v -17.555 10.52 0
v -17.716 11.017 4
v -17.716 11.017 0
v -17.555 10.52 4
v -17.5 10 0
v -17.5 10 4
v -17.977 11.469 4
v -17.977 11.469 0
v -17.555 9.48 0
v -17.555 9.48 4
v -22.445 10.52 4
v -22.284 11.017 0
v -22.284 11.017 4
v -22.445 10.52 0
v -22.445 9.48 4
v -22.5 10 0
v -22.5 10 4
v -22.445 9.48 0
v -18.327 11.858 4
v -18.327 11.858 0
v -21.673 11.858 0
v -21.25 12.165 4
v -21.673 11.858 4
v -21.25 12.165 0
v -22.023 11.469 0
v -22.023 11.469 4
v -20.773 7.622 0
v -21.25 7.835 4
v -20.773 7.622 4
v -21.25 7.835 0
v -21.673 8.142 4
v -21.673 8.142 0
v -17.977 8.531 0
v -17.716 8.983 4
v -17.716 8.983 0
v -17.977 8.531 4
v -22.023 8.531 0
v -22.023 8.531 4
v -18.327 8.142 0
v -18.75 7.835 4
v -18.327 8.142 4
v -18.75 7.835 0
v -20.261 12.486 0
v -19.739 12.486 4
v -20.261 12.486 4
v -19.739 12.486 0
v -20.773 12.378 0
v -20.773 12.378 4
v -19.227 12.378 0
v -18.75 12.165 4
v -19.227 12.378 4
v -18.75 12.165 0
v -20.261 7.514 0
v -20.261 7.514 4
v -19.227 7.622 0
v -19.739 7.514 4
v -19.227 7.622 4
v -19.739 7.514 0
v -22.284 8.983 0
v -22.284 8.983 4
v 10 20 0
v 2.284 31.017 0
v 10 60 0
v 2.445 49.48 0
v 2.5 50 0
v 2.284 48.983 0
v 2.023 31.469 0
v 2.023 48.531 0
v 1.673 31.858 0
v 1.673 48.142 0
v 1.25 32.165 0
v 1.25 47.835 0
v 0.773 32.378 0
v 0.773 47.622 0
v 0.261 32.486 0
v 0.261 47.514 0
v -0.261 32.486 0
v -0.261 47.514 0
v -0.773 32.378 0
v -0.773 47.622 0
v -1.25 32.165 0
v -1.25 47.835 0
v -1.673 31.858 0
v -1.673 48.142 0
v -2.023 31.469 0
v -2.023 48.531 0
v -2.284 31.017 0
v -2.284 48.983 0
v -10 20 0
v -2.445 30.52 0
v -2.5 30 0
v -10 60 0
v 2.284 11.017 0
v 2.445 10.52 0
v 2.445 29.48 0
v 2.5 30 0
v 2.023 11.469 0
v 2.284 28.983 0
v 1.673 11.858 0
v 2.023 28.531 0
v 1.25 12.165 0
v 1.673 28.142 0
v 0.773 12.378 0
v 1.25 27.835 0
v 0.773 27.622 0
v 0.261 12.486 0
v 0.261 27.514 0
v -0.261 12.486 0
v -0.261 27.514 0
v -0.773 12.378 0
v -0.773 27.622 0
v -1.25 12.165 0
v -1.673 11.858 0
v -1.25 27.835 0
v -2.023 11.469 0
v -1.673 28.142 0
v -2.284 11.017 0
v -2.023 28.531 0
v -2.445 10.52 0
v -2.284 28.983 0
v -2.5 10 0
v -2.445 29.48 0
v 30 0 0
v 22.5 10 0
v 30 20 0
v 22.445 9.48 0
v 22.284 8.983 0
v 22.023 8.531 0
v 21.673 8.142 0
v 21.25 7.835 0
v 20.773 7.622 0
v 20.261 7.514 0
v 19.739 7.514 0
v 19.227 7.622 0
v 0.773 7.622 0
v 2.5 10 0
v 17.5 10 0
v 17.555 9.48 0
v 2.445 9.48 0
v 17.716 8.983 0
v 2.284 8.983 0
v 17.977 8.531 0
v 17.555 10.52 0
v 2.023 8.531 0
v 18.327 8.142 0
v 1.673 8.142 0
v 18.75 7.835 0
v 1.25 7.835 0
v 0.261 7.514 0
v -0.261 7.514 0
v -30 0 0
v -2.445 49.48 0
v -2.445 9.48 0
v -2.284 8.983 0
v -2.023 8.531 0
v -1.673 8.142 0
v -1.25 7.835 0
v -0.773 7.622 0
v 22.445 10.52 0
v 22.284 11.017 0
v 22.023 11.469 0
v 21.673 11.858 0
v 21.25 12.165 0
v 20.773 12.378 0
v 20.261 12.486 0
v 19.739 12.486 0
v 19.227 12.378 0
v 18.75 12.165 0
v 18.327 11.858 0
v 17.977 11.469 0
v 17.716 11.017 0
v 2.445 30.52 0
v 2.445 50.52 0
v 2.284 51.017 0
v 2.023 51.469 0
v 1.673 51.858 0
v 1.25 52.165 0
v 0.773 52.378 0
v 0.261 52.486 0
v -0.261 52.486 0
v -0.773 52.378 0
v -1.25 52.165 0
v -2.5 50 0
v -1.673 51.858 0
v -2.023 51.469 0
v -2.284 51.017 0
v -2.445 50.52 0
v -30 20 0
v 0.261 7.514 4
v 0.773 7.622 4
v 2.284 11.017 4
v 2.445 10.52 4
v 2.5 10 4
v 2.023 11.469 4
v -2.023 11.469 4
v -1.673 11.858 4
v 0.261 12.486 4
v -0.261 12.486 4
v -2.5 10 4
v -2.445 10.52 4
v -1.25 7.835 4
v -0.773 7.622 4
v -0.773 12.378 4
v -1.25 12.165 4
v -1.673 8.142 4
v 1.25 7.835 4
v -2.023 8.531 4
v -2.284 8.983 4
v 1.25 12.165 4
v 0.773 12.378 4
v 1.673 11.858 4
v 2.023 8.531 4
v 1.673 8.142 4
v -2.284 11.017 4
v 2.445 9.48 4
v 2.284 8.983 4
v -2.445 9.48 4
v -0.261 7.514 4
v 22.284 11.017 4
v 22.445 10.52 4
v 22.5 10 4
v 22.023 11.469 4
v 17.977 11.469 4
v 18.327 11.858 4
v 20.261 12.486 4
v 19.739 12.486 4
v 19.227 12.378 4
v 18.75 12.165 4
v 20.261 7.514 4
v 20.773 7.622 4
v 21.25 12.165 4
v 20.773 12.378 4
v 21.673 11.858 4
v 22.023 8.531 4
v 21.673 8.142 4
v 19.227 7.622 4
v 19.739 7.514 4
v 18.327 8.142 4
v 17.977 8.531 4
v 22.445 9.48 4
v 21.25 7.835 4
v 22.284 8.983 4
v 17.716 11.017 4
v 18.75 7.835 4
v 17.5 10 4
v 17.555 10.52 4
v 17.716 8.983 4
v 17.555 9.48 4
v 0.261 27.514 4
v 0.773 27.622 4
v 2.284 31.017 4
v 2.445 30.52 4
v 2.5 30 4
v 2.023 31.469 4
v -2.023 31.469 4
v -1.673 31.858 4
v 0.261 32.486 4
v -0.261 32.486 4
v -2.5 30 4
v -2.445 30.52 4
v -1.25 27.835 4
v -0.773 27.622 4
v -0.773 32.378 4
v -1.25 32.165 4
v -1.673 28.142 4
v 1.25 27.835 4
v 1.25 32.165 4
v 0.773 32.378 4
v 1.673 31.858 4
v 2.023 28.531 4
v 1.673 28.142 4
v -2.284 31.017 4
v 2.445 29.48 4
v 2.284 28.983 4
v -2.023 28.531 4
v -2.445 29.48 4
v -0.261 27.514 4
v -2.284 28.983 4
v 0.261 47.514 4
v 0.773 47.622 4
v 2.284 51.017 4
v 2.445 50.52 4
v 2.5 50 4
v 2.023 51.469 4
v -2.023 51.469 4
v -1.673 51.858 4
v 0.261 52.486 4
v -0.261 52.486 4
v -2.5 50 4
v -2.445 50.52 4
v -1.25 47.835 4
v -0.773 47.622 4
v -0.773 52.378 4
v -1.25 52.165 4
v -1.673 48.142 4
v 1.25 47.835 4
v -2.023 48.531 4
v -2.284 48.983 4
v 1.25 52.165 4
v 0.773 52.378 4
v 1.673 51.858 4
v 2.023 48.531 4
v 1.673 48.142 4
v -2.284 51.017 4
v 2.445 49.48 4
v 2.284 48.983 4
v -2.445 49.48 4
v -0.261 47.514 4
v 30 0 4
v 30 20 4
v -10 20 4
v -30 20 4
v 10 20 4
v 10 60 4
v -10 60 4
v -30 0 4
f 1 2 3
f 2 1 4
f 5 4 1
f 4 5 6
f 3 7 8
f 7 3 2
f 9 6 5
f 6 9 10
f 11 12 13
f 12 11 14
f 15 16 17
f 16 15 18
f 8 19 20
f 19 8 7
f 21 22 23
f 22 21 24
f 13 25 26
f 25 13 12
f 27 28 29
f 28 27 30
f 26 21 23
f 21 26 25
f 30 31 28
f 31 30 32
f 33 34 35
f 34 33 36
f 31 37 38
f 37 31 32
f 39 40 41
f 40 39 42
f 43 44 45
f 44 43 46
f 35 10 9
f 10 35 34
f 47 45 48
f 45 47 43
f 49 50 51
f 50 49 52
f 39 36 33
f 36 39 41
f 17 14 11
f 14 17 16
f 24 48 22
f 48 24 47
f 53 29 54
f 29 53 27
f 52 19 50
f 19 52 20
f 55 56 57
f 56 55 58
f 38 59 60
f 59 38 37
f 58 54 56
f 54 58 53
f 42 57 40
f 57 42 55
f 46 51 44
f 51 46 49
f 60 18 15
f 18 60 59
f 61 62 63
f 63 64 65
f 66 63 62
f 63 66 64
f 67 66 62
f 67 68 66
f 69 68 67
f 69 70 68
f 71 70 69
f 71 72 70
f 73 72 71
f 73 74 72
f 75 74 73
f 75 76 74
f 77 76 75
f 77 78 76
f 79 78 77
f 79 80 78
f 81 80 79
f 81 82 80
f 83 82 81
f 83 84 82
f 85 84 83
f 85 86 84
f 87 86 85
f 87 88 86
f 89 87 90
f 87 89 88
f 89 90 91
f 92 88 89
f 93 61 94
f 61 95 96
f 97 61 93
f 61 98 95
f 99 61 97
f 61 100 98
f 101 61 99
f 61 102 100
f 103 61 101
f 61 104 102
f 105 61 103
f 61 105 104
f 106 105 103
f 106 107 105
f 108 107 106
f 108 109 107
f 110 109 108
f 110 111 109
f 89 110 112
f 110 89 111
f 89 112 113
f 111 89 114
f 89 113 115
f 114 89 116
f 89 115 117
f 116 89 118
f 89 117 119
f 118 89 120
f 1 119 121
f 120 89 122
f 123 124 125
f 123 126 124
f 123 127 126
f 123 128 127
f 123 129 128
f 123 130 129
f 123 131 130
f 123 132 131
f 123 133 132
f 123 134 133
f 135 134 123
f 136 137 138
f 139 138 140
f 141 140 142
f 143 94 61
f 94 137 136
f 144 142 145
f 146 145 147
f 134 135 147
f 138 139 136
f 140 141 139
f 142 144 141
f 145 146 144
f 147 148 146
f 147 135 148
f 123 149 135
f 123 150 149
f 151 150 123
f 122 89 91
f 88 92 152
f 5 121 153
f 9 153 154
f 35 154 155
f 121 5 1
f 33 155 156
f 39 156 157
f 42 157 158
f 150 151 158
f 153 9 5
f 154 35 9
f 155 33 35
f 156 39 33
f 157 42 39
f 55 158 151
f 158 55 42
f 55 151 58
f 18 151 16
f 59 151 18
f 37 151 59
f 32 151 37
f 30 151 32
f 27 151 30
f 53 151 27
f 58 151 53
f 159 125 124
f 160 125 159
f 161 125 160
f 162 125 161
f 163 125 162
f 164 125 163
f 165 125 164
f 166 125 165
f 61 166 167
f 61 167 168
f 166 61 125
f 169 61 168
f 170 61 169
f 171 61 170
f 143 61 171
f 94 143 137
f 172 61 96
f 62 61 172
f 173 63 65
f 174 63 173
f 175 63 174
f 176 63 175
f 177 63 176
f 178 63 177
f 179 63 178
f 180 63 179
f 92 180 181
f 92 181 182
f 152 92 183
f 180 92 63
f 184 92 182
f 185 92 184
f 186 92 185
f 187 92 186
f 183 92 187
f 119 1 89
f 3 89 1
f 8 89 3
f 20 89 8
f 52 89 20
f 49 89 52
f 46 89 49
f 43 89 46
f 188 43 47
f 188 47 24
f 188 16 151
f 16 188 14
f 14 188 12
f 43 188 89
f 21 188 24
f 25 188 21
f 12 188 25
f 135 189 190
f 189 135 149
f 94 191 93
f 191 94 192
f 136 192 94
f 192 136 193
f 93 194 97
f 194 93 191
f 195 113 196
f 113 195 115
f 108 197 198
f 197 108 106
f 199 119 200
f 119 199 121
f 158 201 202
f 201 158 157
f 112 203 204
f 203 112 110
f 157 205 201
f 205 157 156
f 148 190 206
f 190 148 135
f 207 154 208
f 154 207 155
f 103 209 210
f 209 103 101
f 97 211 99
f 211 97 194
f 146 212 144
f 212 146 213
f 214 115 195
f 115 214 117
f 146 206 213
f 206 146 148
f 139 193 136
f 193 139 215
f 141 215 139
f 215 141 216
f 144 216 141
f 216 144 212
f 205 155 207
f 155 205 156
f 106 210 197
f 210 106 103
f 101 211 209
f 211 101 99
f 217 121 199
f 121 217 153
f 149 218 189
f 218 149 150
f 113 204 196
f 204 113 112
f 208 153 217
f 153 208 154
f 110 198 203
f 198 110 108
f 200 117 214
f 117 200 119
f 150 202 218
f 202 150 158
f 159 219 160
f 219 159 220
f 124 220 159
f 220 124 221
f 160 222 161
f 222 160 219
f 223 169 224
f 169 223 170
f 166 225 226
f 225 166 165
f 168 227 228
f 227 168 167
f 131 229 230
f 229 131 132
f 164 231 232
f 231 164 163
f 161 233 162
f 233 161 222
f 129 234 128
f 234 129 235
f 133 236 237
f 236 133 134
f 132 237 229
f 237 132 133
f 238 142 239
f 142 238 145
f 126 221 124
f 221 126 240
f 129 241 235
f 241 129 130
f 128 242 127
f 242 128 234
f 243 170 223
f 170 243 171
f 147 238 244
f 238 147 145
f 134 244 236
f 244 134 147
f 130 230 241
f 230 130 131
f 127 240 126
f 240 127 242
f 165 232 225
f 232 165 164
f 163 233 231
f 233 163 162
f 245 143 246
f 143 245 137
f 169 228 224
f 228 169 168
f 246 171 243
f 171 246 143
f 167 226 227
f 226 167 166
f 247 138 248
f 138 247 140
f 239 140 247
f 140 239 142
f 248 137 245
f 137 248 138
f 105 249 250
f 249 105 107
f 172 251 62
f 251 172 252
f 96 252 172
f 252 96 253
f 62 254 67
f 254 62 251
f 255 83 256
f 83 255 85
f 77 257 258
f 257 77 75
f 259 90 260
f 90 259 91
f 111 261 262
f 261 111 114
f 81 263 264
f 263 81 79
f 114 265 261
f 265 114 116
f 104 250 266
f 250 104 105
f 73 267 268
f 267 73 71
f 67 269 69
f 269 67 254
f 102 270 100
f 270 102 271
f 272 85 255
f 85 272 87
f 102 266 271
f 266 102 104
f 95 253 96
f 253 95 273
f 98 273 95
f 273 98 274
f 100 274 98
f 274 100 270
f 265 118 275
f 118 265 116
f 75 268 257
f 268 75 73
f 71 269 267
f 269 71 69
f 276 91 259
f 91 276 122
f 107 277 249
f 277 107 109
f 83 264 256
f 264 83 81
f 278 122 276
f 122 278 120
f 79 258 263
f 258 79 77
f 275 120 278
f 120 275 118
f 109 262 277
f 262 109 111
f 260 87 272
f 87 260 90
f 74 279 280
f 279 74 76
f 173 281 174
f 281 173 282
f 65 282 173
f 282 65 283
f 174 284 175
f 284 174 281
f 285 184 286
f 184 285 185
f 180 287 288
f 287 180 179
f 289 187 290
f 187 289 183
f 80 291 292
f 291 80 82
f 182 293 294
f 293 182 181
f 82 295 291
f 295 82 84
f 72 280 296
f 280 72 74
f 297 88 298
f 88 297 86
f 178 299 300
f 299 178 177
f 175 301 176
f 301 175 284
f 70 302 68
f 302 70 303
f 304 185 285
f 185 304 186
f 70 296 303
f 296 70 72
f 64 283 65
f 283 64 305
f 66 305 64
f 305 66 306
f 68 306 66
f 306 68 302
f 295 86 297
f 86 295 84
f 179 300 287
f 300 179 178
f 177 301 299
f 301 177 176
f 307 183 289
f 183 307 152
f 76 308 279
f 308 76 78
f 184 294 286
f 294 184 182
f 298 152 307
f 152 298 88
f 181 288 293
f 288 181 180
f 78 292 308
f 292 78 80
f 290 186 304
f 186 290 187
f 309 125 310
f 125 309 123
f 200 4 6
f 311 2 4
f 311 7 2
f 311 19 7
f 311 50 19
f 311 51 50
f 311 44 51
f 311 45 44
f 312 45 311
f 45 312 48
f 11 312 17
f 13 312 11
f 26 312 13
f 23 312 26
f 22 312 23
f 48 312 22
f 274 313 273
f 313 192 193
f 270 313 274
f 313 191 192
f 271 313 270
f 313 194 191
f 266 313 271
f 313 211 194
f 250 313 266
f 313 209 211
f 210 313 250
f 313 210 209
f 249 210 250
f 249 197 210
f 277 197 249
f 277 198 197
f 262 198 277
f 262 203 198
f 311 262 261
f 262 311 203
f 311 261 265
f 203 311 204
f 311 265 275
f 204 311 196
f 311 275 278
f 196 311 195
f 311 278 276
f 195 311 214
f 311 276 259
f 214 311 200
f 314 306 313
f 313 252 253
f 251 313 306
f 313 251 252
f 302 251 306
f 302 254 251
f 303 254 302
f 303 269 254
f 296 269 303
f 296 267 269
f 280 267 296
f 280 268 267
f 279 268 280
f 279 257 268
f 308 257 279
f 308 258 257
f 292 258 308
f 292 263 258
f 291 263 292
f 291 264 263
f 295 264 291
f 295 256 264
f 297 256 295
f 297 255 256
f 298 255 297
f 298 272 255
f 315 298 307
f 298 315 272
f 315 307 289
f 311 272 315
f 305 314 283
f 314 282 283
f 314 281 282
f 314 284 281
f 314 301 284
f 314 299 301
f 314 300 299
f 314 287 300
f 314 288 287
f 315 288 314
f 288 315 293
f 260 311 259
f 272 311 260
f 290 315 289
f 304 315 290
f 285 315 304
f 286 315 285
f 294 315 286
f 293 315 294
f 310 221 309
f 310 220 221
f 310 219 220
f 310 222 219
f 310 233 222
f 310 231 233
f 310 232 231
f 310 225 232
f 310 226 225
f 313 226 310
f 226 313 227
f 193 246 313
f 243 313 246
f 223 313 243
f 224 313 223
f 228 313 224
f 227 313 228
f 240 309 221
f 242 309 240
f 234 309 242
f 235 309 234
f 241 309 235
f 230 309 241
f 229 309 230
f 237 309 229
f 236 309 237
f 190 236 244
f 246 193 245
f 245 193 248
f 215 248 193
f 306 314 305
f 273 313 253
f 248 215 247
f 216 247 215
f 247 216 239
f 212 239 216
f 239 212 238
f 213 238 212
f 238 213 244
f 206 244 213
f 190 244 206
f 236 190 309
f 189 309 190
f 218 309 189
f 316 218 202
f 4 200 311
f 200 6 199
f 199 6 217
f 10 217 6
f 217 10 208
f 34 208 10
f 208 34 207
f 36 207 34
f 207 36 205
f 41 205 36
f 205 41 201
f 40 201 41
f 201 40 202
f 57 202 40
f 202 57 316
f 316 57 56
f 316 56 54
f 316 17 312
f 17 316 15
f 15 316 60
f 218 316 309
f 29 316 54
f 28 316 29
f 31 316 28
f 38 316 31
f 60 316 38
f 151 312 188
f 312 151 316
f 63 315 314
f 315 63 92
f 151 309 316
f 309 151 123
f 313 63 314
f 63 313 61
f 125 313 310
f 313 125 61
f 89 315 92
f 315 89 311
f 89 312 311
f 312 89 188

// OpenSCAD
// compatible avec https://fr.aliexpress.com/item/32963365007.html
// v1

A_x = 60;
B_x = 20;

A_y = A_x;
B_y = B_x;

epp = 4 ;

dia = 5 ;  // diameter of holes


module connector(){
    difference() {
        translate([-30,0,0])
    cube([A_x, A_y, epp]);
    {
        // holes on X axis
        for (i = [ 0 : 2 ]) {
          translate([-20 +  i*20, 10, 0])
            cylinder(r=dia/2, h=10, $fn = 30);         
          };
        // holes for Y axis
        for (j = [ 0 : 1 ]) {
          translate([0, 30 +  j*20,  0])
            cylinder(r=dia/2, h=10, $fn = 30);         
        }
        
        // coupes en miroir
        translate([10, 20, 0])
        cube([25, 40, 10]); 
        mirror([90, 0, 0 ])
        translate([10, 20, 0])
        cube([25, 40, 10]); 
        
        
        
//        // coupure en biais
//        
//        translate([40,40,0])
//        rotate([0,0,45+90])
//        translate([0, -15, 0])
//        cube([100,30, 20], center= true);
        
    }
    }
}


connector();
